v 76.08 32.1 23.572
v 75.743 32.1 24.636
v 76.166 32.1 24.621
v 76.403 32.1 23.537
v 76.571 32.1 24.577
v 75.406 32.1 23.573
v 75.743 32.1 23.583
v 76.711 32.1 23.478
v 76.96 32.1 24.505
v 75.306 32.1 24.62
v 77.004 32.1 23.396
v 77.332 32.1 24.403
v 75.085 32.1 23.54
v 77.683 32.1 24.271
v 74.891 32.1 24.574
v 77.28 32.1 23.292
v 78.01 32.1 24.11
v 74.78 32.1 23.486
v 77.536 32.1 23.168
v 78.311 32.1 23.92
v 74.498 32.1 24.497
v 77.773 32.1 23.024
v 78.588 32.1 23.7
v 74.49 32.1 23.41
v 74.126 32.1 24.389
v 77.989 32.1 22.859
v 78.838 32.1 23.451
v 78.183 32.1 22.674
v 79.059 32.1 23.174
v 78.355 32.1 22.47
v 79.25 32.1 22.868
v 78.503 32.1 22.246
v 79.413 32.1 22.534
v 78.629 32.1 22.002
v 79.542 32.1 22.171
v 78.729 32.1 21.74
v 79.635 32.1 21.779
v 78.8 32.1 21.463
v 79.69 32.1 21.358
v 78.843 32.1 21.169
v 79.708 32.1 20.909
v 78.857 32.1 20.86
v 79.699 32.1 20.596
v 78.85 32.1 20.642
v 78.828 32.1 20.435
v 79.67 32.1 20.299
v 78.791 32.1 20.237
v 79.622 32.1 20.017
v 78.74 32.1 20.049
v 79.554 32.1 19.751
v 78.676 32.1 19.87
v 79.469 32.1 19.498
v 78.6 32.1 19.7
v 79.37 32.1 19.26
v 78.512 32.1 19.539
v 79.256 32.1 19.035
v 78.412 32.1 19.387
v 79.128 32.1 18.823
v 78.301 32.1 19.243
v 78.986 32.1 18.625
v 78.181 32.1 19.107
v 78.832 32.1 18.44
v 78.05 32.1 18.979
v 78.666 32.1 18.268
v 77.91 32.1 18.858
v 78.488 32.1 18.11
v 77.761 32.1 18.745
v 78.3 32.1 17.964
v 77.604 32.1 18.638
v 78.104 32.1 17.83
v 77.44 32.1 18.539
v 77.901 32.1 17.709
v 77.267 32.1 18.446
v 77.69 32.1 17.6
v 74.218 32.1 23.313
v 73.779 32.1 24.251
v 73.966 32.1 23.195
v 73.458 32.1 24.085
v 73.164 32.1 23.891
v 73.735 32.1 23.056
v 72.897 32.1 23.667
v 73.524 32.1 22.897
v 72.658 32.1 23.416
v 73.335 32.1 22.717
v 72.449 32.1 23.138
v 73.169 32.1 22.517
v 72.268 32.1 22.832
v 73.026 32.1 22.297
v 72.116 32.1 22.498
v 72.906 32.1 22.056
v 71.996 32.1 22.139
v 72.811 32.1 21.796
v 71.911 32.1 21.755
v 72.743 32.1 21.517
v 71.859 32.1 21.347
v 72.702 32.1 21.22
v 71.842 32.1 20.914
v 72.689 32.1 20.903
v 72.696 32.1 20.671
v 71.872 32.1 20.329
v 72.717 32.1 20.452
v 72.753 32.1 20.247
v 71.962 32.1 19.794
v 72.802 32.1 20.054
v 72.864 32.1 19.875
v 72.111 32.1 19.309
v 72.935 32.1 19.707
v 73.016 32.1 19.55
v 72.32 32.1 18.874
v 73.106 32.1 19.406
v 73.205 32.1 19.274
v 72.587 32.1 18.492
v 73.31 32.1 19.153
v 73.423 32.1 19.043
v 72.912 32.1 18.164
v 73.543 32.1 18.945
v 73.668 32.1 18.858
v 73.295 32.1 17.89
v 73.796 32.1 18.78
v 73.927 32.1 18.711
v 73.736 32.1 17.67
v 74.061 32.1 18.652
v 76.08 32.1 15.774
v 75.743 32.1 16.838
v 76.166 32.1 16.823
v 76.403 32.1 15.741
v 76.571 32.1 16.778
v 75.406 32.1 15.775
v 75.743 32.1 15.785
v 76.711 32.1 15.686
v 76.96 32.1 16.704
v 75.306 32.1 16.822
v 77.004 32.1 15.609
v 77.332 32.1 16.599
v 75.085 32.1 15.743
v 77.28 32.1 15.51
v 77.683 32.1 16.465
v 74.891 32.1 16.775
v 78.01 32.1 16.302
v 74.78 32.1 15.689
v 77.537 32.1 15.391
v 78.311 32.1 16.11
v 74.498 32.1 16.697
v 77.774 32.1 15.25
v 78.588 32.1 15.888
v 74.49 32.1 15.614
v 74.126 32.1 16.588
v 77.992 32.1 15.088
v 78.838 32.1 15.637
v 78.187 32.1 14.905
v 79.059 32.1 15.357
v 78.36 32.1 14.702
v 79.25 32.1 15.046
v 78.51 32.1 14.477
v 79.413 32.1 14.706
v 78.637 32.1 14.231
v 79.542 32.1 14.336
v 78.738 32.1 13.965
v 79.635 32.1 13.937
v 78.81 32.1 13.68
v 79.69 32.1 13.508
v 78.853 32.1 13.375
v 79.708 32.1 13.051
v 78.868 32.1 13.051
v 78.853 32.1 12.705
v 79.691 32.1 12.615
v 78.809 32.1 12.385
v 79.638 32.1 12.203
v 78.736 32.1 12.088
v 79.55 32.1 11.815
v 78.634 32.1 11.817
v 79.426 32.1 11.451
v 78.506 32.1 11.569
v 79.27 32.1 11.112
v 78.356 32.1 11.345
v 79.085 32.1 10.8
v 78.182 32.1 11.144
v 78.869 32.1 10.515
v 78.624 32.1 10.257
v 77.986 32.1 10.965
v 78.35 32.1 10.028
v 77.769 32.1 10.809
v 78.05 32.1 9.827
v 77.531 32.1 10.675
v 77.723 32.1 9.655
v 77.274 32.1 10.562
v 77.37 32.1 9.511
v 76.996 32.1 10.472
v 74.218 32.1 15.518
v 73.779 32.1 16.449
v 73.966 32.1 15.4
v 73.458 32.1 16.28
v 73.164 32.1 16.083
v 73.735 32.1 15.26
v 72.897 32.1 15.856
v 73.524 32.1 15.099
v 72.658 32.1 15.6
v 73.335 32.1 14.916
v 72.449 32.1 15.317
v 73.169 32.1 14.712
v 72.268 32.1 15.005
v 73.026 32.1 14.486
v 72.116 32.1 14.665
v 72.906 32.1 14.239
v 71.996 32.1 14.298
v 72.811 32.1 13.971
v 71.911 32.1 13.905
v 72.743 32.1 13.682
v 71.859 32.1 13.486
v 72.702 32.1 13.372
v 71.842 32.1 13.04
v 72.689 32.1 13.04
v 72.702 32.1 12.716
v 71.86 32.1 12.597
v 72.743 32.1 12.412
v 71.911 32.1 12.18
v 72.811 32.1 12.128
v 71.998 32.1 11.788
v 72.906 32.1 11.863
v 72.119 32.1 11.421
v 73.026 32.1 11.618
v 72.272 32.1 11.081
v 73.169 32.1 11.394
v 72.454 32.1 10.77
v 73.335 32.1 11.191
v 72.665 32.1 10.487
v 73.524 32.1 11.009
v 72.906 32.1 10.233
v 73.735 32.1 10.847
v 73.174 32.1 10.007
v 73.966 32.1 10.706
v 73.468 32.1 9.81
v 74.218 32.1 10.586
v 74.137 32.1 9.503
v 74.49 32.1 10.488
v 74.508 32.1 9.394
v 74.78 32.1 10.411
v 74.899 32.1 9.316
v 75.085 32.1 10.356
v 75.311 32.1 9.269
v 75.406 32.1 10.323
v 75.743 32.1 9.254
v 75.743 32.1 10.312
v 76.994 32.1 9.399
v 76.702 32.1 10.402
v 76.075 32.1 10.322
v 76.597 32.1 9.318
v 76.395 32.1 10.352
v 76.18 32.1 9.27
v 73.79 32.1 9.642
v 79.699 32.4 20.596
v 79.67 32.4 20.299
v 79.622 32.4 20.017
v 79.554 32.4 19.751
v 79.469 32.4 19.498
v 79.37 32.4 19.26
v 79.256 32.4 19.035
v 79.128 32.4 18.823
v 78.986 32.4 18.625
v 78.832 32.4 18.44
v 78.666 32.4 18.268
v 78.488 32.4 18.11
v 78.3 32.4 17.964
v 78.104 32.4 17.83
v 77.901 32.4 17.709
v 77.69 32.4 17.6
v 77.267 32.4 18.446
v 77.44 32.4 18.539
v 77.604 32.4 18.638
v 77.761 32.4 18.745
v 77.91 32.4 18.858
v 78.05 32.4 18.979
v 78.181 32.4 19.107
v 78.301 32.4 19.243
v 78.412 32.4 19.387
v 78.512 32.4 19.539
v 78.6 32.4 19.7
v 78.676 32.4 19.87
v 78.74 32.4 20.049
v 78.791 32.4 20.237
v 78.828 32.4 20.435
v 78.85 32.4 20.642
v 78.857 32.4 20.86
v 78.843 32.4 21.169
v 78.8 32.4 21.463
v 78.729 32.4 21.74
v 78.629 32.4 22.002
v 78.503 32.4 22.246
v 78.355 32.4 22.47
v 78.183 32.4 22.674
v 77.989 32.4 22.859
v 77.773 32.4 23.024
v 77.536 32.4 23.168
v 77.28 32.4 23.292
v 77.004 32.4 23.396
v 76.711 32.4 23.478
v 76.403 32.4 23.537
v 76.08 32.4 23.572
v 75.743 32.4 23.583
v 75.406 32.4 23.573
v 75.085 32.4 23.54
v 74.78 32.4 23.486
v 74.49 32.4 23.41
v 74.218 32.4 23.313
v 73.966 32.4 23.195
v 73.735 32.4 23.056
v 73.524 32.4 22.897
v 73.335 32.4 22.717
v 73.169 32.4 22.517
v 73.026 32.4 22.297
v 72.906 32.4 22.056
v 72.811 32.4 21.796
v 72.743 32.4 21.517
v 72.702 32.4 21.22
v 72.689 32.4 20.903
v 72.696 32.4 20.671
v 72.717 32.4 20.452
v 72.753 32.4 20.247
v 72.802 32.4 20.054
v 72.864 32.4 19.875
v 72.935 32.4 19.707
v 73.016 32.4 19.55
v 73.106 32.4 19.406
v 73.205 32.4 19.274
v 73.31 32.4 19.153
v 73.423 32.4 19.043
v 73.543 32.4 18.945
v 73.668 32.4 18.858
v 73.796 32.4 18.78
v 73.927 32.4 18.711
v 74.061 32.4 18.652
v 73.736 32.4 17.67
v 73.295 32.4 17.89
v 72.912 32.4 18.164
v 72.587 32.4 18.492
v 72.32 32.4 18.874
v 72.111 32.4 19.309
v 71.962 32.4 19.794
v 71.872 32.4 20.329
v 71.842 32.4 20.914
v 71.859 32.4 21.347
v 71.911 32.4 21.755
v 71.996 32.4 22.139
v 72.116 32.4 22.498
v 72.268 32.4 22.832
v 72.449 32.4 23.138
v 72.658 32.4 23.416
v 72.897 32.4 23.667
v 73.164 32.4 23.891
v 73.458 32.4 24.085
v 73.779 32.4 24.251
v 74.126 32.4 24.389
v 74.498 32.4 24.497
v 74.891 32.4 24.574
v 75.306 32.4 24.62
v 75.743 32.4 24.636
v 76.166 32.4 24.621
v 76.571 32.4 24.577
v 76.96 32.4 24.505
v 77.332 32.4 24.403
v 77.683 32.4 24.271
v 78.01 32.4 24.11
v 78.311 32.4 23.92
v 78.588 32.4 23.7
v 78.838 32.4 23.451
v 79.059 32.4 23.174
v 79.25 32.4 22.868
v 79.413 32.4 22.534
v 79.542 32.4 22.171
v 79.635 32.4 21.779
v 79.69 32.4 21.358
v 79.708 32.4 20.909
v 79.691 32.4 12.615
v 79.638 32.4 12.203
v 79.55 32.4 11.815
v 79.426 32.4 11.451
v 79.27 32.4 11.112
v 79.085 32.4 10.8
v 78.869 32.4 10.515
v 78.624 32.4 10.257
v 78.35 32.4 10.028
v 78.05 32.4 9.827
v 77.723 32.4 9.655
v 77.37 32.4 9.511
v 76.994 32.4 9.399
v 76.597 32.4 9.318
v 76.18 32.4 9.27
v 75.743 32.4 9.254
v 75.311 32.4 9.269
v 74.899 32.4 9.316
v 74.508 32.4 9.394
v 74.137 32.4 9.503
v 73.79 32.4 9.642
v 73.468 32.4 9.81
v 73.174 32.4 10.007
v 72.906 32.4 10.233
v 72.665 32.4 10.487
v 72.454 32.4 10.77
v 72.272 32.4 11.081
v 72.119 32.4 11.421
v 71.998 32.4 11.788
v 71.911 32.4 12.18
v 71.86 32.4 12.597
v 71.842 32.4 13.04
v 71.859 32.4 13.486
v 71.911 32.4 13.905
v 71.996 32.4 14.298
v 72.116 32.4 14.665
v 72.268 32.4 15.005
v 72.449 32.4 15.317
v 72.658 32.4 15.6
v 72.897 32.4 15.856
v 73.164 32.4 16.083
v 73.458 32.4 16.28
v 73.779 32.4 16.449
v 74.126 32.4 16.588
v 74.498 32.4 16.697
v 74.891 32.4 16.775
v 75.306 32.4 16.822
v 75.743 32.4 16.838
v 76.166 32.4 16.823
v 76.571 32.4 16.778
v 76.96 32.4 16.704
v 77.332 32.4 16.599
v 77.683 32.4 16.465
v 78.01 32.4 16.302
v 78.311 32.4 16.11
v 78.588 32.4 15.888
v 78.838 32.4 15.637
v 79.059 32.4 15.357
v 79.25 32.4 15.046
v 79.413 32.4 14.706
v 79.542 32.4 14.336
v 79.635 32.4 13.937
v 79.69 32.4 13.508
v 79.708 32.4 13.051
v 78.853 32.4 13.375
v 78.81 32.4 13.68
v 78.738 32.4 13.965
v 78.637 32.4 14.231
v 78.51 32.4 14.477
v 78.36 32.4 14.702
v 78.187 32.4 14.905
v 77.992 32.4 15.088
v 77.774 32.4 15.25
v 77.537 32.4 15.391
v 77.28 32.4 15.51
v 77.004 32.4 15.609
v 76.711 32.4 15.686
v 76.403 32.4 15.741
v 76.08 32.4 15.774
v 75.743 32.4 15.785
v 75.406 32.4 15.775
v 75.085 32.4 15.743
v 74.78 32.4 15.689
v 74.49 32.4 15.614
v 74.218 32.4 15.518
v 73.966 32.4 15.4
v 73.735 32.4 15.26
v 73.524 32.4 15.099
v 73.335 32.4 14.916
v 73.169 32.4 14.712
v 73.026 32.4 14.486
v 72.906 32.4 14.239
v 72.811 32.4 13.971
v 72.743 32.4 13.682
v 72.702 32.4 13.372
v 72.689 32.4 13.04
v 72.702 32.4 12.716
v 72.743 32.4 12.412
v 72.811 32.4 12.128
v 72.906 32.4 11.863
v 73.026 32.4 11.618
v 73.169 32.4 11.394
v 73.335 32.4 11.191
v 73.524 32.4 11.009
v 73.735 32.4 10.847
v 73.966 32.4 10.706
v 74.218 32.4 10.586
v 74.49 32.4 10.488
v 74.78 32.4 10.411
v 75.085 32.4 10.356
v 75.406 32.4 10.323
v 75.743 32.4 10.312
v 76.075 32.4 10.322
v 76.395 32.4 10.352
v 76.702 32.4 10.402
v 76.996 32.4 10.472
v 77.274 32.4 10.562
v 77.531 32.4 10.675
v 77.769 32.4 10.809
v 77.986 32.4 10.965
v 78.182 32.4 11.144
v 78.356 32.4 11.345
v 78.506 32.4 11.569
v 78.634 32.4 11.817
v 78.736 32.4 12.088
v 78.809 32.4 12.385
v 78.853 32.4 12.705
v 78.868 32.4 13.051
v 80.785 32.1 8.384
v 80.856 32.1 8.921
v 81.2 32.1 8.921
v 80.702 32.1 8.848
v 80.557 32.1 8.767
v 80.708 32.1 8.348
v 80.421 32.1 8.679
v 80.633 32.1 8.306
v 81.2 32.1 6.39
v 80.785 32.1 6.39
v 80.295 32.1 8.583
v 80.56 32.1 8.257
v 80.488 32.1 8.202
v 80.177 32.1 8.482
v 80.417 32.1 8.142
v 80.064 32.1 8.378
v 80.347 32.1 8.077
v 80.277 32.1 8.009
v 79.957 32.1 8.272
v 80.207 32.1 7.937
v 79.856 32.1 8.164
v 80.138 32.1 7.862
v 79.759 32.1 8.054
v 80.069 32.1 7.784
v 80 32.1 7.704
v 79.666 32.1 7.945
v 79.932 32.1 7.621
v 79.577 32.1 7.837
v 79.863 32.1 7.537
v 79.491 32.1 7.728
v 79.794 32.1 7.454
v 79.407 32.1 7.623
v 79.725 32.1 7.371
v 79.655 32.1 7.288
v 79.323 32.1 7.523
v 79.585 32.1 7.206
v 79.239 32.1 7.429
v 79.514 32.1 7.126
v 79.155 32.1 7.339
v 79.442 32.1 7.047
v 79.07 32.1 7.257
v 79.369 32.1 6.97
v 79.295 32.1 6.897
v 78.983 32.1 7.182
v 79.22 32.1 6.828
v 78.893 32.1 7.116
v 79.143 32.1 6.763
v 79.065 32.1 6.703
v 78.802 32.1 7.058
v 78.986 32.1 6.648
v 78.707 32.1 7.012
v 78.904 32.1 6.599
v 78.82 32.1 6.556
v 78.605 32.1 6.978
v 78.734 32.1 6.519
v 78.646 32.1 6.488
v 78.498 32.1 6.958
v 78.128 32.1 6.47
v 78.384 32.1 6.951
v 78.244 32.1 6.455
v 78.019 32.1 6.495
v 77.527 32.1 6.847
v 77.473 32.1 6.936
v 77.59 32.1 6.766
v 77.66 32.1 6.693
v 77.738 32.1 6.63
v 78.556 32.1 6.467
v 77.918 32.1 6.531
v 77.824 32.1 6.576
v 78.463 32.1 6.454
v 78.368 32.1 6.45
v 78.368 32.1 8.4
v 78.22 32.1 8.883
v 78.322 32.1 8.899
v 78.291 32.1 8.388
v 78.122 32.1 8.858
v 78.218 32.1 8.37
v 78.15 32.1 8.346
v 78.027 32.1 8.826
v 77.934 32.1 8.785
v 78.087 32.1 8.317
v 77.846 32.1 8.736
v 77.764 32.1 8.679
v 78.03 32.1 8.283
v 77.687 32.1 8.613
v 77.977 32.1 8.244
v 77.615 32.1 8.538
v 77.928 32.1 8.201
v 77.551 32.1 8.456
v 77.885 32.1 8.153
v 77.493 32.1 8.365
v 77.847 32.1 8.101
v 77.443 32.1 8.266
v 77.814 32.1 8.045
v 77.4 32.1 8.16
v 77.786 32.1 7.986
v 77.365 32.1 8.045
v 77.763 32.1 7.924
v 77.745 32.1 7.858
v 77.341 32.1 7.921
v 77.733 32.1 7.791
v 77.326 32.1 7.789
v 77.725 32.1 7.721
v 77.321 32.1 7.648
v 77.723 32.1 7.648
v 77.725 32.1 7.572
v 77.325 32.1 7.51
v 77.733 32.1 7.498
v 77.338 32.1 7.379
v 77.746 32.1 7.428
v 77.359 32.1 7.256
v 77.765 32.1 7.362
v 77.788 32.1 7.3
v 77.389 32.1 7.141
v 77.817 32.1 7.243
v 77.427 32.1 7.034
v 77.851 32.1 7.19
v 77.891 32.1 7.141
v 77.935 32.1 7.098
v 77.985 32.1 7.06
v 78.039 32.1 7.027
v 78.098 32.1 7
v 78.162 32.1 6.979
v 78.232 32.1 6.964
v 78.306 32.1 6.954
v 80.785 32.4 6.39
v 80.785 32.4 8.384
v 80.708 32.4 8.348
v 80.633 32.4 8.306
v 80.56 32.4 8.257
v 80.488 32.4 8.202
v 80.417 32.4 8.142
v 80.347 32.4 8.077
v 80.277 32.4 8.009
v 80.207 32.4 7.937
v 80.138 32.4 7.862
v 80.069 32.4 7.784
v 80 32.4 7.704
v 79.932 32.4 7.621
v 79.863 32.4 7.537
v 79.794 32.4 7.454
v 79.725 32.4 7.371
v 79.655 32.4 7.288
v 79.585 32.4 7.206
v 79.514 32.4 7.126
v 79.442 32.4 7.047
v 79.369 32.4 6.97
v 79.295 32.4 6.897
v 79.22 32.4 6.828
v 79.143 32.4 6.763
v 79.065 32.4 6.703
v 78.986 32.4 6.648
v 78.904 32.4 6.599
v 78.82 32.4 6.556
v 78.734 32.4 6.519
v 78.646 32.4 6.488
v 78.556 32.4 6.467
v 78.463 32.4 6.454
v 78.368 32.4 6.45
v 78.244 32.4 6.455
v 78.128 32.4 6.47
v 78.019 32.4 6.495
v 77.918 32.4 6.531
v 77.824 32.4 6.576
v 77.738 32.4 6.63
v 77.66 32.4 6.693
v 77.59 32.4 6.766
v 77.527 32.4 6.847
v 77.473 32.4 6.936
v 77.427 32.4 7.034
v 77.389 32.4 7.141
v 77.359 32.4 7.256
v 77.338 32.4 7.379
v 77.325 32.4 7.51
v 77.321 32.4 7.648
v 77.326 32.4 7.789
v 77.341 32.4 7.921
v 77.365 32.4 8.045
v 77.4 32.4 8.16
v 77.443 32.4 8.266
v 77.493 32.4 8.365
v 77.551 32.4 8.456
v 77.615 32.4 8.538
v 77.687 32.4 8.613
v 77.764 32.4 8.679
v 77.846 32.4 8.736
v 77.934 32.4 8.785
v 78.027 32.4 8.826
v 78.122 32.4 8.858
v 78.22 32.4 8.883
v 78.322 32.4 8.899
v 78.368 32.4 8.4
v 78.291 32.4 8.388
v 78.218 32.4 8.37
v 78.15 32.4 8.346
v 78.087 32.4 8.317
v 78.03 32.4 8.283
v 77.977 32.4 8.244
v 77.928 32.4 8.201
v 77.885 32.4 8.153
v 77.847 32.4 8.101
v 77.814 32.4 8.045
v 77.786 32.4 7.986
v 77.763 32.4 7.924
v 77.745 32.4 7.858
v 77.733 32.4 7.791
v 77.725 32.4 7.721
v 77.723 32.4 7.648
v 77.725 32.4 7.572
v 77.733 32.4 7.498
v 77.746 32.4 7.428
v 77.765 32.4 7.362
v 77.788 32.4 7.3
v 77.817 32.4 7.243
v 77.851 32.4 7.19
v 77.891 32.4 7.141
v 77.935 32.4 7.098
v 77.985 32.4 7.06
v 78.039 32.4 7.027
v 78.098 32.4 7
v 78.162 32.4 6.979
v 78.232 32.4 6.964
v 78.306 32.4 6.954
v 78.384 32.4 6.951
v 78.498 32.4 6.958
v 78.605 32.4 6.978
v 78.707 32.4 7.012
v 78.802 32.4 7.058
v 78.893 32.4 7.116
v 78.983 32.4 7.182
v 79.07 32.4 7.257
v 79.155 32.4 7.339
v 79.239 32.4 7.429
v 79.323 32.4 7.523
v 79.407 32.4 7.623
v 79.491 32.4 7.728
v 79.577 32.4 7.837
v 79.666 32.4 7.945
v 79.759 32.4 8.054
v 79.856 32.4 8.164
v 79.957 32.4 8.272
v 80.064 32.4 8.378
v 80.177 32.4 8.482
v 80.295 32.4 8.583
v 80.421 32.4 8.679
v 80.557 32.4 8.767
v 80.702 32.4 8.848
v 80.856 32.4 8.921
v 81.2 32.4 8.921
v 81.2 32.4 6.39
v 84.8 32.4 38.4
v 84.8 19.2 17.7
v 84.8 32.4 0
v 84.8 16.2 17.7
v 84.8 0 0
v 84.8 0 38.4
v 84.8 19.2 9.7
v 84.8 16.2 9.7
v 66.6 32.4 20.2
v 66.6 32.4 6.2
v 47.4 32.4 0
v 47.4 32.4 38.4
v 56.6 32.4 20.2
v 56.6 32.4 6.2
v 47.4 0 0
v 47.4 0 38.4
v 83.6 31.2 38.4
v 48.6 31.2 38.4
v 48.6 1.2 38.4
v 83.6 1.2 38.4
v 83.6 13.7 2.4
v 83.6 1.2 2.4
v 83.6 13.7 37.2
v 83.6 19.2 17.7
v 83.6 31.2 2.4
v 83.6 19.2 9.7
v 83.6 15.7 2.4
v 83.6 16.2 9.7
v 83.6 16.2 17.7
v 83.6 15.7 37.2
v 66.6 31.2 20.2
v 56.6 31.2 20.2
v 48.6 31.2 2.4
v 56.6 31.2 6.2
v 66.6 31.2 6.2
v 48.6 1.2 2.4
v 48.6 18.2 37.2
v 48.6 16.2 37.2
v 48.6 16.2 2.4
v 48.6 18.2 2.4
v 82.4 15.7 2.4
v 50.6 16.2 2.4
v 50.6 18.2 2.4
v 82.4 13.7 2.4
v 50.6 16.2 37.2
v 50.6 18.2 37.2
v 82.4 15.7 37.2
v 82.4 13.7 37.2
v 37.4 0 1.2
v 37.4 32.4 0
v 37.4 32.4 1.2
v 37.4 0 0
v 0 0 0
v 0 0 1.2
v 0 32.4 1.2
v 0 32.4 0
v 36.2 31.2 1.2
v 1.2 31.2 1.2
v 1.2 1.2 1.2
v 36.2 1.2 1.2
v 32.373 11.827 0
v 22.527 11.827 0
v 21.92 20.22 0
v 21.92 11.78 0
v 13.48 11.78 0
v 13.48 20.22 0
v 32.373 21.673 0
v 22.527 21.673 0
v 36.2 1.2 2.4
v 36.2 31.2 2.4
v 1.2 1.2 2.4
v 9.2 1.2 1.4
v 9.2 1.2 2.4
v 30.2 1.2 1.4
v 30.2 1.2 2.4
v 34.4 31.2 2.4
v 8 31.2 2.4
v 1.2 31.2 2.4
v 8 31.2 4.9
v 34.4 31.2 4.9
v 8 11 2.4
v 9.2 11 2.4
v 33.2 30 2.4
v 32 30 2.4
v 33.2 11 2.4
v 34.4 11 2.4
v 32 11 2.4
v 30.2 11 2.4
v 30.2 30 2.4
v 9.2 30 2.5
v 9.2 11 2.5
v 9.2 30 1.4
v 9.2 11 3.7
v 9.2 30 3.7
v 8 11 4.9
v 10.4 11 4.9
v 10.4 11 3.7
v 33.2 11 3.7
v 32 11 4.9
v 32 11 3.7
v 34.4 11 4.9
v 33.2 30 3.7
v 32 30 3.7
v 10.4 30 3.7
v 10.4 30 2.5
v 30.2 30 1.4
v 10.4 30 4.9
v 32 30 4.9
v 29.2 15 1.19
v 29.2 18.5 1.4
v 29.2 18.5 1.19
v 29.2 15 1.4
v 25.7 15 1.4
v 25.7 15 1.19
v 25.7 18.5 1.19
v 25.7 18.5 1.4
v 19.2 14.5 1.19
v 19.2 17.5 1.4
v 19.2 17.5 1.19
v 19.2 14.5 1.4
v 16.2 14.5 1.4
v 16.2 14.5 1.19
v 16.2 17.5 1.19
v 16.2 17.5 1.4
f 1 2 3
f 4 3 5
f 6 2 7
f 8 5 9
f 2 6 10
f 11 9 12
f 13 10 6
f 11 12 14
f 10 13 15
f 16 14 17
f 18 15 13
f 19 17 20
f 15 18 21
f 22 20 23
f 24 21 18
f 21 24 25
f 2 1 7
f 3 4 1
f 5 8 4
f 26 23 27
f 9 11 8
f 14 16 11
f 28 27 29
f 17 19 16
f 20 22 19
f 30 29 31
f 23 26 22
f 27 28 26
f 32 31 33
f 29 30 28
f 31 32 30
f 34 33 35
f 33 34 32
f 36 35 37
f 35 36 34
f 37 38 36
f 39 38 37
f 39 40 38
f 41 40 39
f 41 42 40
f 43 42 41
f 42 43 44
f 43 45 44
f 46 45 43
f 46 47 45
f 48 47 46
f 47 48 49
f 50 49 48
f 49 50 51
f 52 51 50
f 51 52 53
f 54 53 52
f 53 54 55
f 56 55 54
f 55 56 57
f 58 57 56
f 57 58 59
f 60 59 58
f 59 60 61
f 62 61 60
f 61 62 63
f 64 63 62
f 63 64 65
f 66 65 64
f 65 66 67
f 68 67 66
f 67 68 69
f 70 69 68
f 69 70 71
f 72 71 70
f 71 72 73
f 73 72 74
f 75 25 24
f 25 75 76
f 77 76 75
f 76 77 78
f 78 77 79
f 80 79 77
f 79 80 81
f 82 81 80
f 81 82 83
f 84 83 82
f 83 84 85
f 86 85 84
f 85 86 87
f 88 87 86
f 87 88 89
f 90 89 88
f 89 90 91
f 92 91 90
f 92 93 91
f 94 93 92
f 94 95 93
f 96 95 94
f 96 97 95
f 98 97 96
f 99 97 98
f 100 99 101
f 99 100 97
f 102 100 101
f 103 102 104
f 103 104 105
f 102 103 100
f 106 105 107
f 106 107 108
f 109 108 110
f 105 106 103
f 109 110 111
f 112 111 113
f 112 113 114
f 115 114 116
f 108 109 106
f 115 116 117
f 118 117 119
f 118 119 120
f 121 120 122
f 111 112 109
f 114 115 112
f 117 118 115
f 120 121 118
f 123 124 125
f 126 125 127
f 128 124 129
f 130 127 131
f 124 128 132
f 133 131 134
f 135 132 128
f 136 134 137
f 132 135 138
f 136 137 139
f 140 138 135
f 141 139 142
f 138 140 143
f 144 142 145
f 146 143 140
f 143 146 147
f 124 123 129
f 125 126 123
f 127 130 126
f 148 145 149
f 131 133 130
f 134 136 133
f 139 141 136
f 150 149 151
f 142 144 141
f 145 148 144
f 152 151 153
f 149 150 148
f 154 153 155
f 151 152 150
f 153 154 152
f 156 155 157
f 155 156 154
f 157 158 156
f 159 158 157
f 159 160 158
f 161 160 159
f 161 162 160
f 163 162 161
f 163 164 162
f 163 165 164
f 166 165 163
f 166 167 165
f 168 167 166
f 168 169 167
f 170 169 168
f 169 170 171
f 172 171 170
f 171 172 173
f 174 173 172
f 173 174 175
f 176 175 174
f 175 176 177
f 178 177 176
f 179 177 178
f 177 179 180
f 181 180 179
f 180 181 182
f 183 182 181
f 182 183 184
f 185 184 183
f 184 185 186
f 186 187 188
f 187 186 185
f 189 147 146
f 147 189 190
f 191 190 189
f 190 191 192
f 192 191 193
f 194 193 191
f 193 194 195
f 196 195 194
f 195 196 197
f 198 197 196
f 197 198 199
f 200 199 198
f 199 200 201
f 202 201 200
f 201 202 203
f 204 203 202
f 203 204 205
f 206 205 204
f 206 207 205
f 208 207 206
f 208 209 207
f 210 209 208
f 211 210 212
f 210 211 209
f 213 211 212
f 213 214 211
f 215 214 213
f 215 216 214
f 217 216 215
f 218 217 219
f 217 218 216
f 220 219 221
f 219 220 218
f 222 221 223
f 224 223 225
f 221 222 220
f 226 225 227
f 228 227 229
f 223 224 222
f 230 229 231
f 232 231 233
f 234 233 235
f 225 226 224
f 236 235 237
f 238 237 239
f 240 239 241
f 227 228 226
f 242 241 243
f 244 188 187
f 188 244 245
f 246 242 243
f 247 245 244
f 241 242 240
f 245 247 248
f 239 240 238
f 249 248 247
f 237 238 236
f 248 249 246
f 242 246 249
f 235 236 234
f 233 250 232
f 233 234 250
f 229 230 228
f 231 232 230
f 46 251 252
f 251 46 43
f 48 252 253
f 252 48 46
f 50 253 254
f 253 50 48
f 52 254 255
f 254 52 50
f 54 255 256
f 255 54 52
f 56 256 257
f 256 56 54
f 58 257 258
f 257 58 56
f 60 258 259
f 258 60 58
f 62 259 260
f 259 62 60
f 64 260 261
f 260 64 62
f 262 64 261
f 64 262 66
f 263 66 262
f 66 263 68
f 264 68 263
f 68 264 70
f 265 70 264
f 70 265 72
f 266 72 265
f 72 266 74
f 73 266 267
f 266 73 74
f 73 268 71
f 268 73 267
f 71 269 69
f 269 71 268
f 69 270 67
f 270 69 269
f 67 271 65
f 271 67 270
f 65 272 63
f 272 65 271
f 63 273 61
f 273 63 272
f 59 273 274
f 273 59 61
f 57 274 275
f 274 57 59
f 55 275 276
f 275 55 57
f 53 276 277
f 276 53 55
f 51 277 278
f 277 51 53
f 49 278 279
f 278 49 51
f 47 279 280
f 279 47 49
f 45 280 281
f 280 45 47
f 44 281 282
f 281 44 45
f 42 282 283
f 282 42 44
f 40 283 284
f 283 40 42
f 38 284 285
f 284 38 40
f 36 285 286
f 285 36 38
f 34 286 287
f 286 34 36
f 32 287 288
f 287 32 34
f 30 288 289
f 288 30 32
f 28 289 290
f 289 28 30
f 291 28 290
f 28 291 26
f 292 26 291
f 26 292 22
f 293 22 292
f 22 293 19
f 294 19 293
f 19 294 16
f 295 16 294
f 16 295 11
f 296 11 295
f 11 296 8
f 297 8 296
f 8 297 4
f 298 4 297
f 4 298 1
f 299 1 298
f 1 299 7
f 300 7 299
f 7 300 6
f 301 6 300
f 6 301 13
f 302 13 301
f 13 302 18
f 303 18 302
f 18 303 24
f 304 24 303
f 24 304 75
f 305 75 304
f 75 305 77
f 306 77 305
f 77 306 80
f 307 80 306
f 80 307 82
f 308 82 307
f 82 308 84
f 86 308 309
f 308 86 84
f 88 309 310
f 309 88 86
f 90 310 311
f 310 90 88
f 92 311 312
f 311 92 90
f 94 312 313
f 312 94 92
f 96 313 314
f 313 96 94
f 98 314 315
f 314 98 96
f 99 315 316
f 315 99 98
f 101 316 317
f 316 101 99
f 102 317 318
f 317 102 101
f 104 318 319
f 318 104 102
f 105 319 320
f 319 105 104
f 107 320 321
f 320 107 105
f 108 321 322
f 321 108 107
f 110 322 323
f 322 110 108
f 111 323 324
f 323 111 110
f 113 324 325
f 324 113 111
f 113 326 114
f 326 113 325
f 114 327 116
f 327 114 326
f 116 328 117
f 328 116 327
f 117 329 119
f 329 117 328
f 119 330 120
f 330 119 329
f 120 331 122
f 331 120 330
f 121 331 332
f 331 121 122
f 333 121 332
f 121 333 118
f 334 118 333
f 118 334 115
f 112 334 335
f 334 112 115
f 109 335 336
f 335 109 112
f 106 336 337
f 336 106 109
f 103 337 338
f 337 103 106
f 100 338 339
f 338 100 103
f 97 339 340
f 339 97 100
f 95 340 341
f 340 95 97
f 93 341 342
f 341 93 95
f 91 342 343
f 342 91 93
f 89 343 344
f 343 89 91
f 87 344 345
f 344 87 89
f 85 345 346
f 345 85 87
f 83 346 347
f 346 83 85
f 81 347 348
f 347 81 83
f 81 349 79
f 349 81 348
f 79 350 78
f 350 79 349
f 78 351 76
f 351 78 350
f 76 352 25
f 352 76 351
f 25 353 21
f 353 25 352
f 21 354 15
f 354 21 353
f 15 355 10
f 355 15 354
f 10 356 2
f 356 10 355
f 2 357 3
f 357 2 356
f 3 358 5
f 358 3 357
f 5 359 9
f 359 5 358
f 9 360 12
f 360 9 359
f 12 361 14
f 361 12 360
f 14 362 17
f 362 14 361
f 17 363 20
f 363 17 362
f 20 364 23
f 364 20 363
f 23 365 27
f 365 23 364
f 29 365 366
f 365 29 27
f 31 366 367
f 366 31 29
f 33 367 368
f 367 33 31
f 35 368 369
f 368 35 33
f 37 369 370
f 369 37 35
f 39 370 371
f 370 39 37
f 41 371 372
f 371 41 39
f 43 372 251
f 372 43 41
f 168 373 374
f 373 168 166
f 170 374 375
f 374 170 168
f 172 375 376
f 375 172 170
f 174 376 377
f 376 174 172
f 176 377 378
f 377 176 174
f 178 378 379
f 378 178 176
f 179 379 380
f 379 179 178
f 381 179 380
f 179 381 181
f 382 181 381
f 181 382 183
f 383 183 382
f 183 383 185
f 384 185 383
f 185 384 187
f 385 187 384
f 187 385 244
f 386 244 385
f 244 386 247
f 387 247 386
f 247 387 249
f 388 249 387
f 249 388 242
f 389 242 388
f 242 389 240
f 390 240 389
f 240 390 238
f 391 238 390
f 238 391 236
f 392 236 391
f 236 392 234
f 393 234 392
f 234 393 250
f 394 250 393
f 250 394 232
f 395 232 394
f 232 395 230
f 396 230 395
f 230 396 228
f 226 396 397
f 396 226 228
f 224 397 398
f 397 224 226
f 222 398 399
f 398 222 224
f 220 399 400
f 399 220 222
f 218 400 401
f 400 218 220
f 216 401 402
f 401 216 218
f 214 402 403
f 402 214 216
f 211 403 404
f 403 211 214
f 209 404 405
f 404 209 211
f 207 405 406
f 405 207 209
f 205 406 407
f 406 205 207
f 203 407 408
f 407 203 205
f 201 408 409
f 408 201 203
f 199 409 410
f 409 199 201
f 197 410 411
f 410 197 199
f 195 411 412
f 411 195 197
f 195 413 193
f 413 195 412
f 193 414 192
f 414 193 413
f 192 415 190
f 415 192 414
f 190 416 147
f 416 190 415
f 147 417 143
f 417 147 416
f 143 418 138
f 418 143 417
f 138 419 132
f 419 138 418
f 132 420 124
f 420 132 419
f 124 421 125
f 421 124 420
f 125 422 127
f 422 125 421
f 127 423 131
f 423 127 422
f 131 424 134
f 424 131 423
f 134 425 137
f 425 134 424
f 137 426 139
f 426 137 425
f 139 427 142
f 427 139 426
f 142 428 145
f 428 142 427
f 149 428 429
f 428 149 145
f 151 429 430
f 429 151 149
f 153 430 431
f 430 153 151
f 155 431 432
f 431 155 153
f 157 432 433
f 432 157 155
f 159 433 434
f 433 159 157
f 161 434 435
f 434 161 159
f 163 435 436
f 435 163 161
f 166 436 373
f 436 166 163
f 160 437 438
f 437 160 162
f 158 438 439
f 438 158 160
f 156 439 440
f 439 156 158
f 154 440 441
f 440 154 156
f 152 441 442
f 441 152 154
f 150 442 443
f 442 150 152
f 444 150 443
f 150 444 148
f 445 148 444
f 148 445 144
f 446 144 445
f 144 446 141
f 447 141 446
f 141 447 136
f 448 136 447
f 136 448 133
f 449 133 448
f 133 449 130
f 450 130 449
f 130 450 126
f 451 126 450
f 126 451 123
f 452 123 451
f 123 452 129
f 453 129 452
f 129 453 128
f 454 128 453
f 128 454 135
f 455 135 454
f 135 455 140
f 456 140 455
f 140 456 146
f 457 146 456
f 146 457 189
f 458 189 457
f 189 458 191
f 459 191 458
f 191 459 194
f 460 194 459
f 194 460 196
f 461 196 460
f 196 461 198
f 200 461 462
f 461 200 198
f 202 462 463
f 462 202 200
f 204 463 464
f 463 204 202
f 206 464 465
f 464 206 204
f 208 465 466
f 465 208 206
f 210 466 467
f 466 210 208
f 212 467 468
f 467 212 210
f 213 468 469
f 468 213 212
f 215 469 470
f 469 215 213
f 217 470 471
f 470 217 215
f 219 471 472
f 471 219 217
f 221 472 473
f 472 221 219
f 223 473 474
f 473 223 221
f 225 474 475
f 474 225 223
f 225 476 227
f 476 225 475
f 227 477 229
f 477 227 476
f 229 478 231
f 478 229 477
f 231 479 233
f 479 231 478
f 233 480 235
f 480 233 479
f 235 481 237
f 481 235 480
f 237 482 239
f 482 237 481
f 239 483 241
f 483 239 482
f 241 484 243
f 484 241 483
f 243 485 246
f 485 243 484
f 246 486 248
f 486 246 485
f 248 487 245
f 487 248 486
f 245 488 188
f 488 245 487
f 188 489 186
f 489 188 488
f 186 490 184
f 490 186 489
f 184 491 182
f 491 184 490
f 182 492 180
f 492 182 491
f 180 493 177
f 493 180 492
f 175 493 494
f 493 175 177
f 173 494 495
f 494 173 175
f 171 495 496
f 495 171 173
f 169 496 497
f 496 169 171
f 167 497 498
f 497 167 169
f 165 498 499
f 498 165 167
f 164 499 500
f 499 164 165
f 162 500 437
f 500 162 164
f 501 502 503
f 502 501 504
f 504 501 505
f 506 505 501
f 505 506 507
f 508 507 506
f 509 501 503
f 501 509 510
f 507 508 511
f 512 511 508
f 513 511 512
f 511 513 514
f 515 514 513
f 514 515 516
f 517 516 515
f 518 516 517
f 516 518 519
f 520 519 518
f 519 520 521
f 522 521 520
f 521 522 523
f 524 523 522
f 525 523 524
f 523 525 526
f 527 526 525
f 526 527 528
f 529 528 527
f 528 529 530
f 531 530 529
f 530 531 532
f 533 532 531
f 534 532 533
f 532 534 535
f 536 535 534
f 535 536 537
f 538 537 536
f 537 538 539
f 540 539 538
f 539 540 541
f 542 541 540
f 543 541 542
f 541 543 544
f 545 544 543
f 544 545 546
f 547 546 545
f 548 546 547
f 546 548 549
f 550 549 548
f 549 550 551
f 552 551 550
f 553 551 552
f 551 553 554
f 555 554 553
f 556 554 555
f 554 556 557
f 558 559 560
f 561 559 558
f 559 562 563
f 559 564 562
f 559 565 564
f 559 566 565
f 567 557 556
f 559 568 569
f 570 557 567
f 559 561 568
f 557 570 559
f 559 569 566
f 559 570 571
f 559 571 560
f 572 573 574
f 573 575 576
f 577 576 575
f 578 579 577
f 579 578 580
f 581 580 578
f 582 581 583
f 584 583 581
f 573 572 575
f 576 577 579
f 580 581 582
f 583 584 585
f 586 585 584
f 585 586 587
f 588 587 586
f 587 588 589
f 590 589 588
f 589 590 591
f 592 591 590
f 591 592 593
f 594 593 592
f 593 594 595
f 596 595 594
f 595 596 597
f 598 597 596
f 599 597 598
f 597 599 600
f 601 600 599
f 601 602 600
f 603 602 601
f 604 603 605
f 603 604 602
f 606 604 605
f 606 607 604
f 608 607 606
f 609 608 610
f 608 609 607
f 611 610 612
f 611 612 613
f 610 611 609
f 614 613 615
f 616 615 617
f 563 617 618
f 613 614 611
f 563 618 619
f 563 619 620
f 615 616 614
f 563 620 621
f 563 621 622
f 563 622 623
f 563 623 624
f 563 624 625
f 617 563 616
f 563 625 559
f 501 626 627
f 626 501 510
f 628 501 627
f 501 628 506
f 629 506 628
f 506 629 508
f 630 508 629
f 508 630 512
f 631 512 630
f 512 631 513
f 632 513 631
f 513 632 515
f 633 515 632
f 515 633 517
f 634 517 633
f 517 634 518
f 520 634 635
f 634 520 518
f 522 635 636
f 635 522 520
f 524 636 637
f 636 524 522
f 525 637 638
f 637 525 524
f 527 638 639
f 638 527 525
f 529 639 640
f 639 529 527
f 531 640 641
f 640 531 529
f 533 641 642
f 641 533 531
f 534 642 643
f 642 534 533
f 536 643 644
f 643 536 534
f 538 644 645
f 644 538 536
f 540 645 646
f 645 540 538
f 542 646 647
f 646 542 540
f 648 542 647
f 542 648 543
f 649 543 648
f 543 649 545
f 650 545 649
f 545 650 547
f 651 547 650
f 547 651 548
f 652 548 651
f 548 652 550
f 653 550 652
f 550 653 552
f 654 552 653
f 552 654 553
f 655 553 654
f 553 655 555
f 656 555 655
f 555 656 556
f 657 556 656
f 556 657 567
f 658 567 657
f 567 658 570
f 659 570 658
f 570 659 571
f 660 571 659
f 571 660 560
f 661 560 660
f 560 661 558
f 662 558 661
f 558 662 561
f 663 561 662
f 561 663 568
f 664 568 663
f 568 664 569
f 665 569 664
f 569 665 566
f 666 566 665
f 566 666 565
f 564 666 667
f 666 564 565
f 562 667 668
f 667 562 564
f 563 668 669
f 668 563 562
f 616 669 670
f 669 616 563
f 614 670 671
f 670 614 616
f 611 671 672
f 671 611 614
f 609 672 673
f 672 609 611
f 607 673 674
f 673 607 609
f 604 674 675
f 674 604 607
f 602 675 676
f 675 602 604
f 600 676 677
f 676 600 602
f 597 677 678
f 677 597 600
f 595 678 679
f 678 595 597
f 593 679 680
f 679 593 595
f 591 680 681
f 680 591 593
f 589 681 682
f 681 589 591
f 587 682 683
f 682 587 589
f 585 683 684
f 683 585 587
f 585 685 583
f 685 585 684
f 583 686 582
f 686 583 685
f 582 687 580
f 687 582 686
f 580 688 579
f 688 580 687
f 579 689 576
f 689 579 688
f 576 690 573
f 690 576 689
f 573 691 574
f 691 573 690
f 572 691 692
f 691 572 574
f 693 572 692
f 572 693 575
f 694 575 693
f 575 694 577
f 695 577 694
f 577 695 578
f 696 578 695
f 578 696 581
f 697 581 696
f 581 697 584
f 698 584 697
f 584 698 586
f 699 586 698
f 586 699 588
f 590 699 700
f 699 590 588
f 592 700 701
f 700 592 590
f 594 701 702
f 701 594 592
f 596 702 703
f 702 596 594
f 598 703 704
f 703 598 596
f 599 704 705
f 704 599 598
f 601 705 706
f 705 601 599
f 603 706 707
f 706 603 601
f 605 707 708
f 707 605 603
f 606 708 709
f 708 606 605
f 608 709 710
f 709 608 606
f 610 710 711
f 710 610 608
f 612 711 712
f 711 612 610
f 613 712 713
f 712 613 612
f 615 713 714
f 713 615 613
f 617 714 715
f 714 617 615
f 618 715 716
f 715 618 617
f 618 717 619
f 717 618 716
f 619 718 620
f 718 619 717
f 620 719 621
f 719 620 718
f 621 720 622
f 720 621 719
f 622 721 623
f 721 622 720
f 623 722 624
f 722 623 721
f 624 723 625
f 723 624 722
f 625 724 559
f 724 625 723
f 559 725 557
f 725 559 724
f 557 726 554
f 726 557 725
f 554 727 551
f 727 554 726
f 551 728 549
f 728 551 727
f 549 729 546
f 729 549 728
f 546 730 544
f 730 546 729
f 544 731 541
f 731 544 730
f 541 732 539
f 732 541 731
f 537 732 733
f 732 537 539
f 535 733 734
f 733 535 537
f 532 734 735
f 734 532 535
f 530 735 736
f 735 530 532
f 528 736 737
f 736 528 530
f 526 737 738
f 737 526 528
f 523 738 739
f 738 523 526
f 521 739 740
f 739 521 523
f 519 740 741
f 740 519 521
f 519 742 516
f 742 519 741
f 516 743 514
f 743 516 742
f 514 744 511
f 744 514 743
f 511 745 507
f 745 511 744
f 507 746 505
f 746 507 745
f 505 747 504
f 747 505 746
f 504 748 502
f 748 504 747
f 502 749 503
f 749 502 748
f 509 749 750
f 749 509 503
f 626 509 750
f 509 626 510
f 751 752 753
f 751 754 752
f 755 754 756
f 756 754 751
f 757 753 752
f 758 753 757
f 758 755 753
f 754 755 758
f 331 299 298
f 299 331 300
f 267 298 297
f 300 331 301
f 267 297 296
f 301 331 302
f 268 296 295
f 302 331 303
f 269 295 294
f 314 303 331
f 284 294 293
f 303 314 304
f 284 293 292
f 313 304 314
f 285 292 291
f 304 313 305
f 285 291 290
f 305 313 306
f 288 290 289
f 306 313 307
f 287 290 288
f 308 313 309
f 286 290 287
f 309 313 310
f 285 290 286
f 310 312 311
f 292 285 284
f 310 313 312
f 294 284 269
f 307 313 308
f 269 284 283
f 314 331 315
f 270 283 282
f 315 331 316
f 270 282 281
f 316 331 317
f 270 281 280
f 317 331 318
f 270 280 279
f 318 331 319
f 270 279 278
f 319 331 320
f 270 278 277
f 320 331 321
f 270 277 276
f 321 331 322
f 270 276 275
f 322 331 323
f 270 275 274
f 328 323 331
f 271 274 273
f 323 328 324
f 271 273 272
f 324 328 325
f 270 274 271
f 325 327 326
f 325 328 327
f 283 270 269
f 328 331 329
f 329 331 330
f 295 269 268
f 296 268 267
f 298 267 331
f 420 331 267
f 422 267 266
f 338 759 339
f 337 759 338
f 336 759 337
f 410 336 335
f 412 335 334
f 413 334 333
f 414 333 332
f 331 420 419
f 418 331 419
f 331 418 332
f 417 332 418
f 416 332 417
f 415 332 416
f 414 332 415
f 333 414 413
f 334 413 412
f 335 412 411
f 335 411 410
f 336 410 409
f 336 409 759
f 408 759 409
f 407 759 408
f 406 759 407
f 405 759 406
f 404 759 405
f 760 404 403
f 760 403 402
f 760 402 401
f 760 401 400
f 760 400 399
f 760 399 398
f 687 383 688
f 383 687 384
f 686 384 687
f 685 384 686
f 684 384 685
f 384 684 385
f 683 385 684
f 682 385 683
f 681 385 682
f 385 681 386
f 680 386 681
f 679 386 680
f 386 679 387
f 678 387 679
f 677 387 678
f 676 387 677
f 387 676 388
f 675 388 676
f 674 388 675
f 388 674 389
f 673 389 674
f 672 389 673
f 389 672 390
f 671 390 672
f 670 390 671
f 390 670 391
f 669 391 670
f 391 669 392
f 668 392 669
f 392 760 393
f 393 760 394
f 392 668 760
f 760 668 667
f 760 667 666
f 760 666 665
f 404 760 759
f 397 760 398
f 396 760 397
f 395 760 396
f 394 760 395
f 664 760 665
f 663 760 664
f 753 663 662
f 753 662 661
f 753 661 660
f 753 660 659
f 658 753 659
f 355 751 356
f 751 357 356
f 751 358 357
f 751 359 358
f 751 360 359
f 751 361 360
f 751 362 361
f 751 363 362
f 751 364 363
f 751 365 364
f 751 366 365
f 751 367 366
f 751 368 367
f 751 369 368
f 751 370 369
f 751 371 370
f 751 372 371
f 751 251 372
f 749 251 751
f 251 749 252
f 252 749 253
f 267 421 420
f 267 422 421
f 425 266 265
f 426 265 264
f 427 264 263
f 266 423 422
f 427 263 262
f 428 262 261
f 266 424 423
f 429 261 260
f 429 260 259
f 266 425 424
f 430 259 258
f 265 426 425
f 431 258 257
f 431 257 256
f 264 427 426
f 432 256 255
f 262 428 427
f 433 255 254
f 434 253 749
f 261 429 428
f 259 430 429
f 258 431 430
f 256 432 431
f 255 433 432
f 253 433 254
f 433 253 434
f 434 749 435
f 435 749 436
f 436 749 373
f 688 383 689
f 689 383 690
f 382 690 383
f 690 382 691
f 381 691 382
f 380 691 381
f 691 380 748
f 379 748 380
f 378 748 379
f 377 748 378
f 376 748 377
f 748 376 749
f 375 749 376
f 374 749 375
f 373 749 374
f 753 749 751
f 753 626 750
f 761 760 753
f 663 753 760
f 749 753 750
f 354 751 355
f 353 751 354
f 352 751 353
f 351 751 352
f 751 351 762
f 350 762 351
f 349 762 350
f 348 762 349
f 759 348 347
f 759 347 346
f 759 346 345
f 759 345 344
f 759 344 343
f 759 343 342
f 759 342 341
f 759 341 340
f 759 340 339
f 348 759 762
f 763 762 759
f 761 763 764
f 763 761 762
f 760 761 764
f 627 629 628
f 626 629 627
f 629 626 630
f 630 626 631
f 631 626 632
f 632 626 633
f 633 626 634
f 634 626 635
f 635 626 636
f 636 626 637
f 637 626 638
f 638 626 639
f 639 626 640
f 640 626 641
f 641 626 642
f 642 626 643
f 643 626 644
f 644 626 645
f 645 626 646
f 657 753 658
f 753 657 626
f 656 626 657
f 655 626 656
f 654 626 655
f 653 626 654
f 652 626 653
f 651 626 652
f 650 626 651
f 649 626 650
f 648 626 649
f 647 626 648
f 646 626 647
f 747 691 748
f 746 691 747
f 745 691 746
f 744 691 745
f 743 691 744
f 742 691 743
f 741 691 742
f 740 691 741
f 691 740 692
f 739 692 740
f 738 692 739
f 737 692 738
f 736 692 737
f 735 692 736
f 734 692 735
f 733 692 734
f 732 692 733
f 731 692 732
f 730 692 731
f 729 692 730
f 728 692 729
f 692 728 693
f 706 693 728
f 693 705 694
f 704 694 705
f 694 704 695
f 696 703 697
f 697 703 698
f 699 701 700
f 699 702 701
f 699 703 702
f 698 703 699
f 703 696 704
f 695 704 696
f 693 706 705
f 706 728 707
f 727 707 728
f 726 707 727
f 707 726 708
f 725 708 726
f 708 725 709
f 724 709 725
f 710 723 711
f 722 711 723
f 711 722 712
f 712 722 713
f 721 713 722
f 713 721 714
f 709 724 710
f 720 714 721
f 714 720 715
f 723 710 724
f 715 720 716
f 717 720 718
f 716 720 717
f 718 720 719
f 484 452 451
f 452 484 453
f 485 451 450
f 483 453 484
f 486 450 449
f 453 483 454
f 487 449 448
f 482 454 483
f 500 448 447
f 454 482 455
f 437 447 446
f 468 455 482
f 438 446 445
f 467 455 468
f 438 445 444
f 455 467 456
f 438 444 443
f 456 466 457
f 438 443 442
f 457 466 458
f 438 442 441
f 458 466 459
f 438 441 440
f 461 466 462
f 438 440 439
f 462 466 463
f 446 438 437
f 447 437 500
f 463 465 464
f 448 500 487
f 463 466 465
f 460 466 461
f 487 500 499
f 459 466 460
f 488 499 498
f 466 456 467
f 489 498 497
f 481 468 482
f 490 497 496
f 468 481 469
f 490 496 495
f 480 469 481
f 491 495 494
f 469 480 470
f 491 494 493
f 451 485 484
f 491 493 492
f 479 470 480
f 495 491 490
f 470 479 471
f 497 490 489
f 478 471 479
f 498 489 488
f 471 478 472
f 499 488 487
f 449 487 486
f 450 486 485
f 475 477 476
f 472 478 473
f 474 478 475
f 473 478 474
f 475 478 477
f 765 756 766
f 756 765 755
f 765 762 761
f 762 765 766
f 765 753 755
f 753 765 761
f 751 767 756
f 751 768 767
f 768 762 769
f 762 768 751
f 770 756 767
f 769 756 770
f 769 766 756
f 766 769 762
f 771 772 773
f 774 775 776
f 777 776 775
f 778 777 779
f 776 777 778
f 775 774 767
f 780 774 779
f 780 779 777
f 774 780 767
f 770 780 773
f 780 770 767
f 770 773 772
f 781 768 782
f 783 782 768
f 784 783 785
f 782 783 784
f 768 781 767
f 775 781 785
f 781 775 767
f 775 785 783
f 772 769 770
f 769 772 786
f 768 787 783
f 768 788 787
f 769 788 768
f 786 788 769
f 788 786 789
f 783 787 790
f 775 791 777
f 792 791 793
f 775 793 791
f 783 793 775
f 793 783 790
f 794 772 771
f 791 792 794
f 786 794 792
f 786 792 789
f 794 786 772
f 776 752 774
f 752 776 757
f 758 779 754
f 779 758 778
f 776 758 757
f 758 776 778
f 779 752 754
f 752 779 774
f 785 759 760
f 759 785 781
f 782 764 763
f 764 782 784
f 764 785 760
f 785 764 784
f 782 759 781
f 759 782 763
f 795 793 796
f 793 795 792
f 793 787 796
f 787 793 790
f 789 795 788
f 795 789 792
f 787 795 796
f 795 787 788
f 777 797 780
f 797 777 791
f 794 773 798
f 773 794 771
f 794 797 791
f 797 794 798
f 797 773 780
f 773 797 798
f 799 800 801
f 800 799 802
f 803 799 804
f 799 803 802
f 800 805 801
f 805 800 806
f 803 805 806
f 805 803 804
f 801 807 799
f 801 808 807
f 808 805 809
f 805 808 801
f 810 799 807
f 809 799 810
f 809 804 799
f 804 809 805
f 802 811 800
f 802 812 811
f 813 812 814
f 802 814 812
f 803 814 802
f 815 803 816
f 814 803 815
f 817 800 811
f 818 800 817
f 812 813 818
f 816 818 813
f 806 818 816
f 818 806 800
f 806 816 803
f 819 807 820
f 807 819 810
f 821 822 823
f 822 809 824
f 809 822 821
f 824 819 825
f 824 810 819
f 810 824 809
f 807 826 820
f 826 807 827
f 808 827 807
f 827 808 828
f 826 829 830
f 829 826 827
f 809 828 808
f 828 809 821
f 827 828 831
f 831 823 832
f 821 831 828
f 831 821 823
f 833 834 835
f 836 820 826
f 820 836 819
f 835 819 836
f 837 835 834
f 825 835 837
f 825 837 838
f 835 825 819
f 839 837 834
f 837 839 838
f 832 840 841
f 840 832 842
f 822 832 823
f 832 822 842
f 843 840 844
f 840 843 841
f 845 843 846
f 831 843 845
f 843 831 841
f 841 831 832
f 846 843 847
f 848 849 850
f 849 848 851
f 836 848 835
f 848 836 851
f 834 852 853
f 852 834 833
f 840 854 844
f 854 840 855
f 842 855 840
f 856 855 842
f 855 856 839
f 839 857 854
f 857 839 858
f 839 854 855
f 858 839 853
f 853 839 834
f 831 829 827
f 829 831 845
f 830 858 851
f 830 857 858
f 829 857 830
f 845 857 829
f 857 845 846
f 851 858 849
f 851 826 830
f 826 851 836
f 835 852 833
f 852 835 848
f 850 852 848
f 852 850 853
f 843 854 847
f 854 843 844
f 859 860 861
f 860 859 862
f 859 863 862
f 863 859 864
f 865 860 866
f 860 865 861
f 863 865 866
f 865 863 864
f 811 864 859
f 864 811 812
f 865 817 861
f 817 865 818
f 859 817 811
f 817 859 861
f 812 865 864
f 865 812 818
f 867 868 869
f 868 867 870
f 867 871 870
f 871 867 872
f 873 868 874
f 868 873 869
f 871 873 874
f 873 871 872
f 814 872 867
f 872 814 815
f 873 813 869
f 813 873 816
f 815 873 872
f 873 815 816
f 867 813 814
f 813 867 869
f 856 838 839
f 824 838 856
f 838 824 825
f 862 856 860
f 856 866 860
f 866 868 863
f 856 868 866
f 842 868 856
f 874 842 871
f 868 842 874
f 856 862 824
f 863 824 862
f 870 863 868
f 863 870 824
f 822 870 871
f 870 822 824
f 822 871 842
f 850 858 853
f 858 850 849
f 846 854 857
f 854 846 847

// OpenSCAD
// MODIFY BELOW VARIABLES TO CUSTOMISE
/*

 WIDTH
  <->
 _____
/     \
▏     ▕       
▏     ▕  ^
▏     ▕  | Height
┕┒    ▕  ⌄ 
 ▕____▕ 

*/

WEMOS_WIDTH = 25;
WEMOS_HEIGHT = 35;
WEMOS_THICKNESS = 1;
WEMOS_WIFI_THICKNESS = 1;
WEMOS_USB_THICKNESS = 2.5;

USB_CABLE_WIDTH = 8;
USB_CABLE_HEIGHT = 3;


/*
 WIDTH
  <->
_______
▏_____ ▏ ^      
▏▏OLED▏▏ | Height
▏▏___▕▕  ⌄
┕┒_____▏  

*/

OLED_WIDTH = 26;
OLED_HEIGHT = 28;
OLED_THICKNESS = 1.3;
DISPLAY_OFFSET_X = 8;
DISPLAY_WIDTH = 14;
DISPLAY_HEIGHT = 10;
DISPLAY_OFFSET_Y = 5;


/*
 WIDTH
  <->
 _______  ^
 ▏○   ◠ ▏ | Height
▕_______▏ ⌄    
SCL -> D1
SDA -> D2

*/
CO2_WIDTH = 24;
CO2_HEIGHT = 19;
CO2_THICKNESS = 1.3;
CO2_OFFSET_LEFT_ENS160 = 7;
CO2_OFFSET_BOTTOM_ENS160 = 12.5;
CO2_ENS160_SIZE = 3;
CO2_COMP_HEIGHT = 1;
CO2_COMP_OFFSET_RIGHT = 3;

CO2_OFFSET_LEFT_AHT21= 16.5;
CO2_OFFSET_BOTTOM_AHT21 = 11.5;
CO2_AHT21_SIZE = 3.5;


/*
           X
          <->
        ________     ^
Y /    /       /|    | Z
 /    /_______/ |    ⌄ 
      |       | /
      |_______|/
*/
BOX_X = WEMOS_HEIGHT;
BOX_Y = 36;
BOX_Z = 30;
WALL_THICKNESS = 1.2;

BOX_X_OUTER = BOX_X + 2 * WALL_THICKNESS;
BOX_Y_OUTER = BOX_Y + 2 * WALL_THICKNESS;
BOX_Z_OUTER = BOX_Z + 2 * WALL_THICKNESS;

BOX_Z_DIFF_MIDDLE2TOP = 15;
BOX_Z_MIDDLE = BOX_Z / 2 + WALL_THICKNESS;

module txt() {
    linear_extrude(WALL_THICKNESS)
        text("CO");
    translate([20, -2, 0])
        linear_extrude(WALL_THICKNESS)
            scale([0.5, 0.5, 1])
                text("2");
}

module box() {
    union() {
        difference() {
            // OUTER BOX
            translate([-WALL_THICKNESS, -WALL_THICKNESS, -WALL_THICKNESS])
                scale([BOX_X_OUTER, BOX_Y_OUTER, BOX_Z_OUTER])
                    cube(1);
            // INNER BOX
            translate([0, -WALL_THICKNESS-0.1, 0])
                scale([BOX_X,BOX_Y+0.1,BOX_Z])
                    cube(1);
            // USB Hole
            translate([BOX_X-0.1, BOX_Y - WEMOS_WIDTH / 2 - USB_CABLE_WIDTH / 2, BOX_Z - BOX_Z_DIFF_MIDDLE2TOP ])
                scale([WALL_THICKNESS+0.2, USB_CABLE_WIDTH, USB_CABLE_HEIGHT])
                    cube(1);
            // DISPLAY HOLE
            translate([DISPLAY_OFFSET_X, BOX_Y - DISPLAY_OFFSET_Y - DISPLAY_WIDTH, BOX_Z - 0.1])
                scale([DISPLAY_HEIGHT, DISPLAY_WIDTH, WALL_THICKNESS + 0.2])
                    cube(1);
            translate([DISPLAY_OFFSET_X + DISPLAY_HEIGHT + 13, 12, BOX_Z_OUTER - 1.25 * WALL_THICKNESS])
                rotate([0,0,90])
                    scale([0.8, 0.8, 1])
                        txt();
            
        }
        // WIFI-SIDE
        translate([0, 0, BOX_Z - BOX_Z_DIFF_MIDDLE2TOP])
            scale([2, BOX_Y, 2])
                cube(1);
        // USB-SIDE
        translate([BOX_X - WALL_THICKNESS, 0, BOX_Z - BOX_Z_DIFF_MIDDLE2TOP - WEMOS_USB_THICKNESS])
            scale([2, BOX_Y, 2])
                cube(1);
    }
}

module cap() {
    difference() {
        union() {
            // BASE
            translate([-WALL_THICKNESS, -WALL_THICKNESS, -WALL_THICKNESS])
                scale([BOX_X_OUTER, WALL_THICKNESS, BOX_Z_OUTER])
                    cube(1);
            // INSET
            translate([0, 0, 0])
                scale([BOX_X, WALL_THICKNESS, BOX_Z])
                    cube(1);
            // HOLDER LEFT
            translate([DISPLAY_OFFSET_X - WALL_THICKNESS, WALL_THICKNESS, WALL_THICKNESS])
                scale([WALL_THICKNESS, CO2_THICKNESS + WALL_THICKNESS, CO2_HEIGHT])
                    cube(1);
            
            // HOLDER RIGHT
            translate([DISPLAY_OFFSET_X + CO2_WIDTH, WALL_THICKNESS, WALL_THICKNESS])
                scale([WALL_THICKNESS, CO2_THICKNESS + WALL_THICKNESS, CO2_HEIGHT])
                    cube(1);

            // HOLDER BOTTOM
            translate([DISPLAY_OFFSET_X-WALL_THICKNESS, WALL_THICKNESS, 0])
                scale([CO2_WIDTH+2*WALL_THICKNESS, CO2_THICKNESS + WALL_THICKNESS, WALL_THICKNESS])
                    cube(1);
            
            // HOLDER TOP
            translate([DISPLAY_OFFSET_X-WALL_THICKNESS, CO2_THICKNESS + WALL_THICKNESS, 0])
                scale([CO2_WIDTH+2*WALL_THICKNESS, WALL_THICKNESS, CO2_HEIGHT + WALL_THICKNESS])
                    cube(1);
        }
        // AHT21
        translate([DISPLAY_OFFSET_X + CO2_OFFSET_LEFT_AHT21,-2*WALL_THICKNESS,WALL_THICKNESS + CO2_OFFSET_BOTTOM_AHT21])
            scale([CO2_AHT21_SIZE, 4 * WALL_THICKNESS, CO2_AHT21_SIZE])
                cube(1);
        
        translate([DISPLAY_OFFSET_X + CO2_OFFSET_LEFT_AHT21 + CO2_AHT21_SIZE / 2,-WALL_THICKNESS-0.01, WALL_THICKNESS + CO2_OFFSET_BOTTOM_AHT21 + CO2_AHT21_SIZE / 2])        
            rotate([-90, 0, 0])
                rotate([0,0,45])
                    cylinder(h=WALL_THICKNESS,r1=2*CO2_AHT21_SIZE,r2=CO2_AHT21_SIZE / sqrt(2),$fn=4);

        // ENS160
        translate([DISPLAY_OFFSET_X + CO2_OFFSET_LEFT_ENS160,-2*WALL_THICKNESS,WALL_THICKNESS + CO2_OFFSET_BOTTOM_ENS160])
            scale([CO2_ENS160_SIZE, 4 * WALL_THICKNESS, CO2_ENS160_SIZE])
                cube(1);
        translate([DISPLAY_OFFSET_X + CO2_OFFSET_LEFT_ENS160 + CO2_ENS160_SIZE / 2,-WALL_THICKNESS-0.01, WALL_THICKNESS + CO2_OFFSET_BOTTOM_ENS160 + CO2_ENS160_SIZE / 2])        
            rotate([-90, 0, 0])
                rotate([0,0,45])
                    cylinder(h=WALL_THICKNESS,r1=2*CO2_ENS160_SIZE,r2=CO2_ENS160_SIZE / sqrt(2),$fn=4);

        // SPARE PLACE FOR COMPONENTS
        translate([DISPLAY_OFFSET_X, WALL_THICKNESS - CO2_COMP_HEIGHT, WALL_THICKNESS])
            scale([CO2_WIDTH - CO2_COMP_OFFSET_RIGHT, CO2_COMP_HEIGHT + 0.1, BOX_Z])
                cube(1);
        // REMOVE PART OF CO2 HOLDER TOP
        translate([DISPLAY_OFFSET_X + WALL_THICKNESS, WALL_THICKNESS, WALL_THICKNESS])
            scale([CO2_WIDTH-2*WALL_THICKNESS, 3*WALL_THICKNESS, CO2_HEIGHT])
                cube(1);
    }
}

translate([BOX_X_OUTER + 10, 0, 0]) // translate where you want it
    rotate([270, 0, 0]) // 2: rotate
        translate([WALL_THICKNESS, -BOX_Y_OUTER + WALL_THICKNESS, WALL_THICKNESS]) // 1. bring to origin 
            box();


translate([0, BOX_Z_OUTER, 0]) // 3. translate where you want it
    rotate([90, 0, 0]) // 2. rotate
        translate([WALL_THICKNESS,WALL_THICKNESS,WALL_THICKNESS]) // 1. bring to origin
            cap();


// cap();
// box();
// txt();
